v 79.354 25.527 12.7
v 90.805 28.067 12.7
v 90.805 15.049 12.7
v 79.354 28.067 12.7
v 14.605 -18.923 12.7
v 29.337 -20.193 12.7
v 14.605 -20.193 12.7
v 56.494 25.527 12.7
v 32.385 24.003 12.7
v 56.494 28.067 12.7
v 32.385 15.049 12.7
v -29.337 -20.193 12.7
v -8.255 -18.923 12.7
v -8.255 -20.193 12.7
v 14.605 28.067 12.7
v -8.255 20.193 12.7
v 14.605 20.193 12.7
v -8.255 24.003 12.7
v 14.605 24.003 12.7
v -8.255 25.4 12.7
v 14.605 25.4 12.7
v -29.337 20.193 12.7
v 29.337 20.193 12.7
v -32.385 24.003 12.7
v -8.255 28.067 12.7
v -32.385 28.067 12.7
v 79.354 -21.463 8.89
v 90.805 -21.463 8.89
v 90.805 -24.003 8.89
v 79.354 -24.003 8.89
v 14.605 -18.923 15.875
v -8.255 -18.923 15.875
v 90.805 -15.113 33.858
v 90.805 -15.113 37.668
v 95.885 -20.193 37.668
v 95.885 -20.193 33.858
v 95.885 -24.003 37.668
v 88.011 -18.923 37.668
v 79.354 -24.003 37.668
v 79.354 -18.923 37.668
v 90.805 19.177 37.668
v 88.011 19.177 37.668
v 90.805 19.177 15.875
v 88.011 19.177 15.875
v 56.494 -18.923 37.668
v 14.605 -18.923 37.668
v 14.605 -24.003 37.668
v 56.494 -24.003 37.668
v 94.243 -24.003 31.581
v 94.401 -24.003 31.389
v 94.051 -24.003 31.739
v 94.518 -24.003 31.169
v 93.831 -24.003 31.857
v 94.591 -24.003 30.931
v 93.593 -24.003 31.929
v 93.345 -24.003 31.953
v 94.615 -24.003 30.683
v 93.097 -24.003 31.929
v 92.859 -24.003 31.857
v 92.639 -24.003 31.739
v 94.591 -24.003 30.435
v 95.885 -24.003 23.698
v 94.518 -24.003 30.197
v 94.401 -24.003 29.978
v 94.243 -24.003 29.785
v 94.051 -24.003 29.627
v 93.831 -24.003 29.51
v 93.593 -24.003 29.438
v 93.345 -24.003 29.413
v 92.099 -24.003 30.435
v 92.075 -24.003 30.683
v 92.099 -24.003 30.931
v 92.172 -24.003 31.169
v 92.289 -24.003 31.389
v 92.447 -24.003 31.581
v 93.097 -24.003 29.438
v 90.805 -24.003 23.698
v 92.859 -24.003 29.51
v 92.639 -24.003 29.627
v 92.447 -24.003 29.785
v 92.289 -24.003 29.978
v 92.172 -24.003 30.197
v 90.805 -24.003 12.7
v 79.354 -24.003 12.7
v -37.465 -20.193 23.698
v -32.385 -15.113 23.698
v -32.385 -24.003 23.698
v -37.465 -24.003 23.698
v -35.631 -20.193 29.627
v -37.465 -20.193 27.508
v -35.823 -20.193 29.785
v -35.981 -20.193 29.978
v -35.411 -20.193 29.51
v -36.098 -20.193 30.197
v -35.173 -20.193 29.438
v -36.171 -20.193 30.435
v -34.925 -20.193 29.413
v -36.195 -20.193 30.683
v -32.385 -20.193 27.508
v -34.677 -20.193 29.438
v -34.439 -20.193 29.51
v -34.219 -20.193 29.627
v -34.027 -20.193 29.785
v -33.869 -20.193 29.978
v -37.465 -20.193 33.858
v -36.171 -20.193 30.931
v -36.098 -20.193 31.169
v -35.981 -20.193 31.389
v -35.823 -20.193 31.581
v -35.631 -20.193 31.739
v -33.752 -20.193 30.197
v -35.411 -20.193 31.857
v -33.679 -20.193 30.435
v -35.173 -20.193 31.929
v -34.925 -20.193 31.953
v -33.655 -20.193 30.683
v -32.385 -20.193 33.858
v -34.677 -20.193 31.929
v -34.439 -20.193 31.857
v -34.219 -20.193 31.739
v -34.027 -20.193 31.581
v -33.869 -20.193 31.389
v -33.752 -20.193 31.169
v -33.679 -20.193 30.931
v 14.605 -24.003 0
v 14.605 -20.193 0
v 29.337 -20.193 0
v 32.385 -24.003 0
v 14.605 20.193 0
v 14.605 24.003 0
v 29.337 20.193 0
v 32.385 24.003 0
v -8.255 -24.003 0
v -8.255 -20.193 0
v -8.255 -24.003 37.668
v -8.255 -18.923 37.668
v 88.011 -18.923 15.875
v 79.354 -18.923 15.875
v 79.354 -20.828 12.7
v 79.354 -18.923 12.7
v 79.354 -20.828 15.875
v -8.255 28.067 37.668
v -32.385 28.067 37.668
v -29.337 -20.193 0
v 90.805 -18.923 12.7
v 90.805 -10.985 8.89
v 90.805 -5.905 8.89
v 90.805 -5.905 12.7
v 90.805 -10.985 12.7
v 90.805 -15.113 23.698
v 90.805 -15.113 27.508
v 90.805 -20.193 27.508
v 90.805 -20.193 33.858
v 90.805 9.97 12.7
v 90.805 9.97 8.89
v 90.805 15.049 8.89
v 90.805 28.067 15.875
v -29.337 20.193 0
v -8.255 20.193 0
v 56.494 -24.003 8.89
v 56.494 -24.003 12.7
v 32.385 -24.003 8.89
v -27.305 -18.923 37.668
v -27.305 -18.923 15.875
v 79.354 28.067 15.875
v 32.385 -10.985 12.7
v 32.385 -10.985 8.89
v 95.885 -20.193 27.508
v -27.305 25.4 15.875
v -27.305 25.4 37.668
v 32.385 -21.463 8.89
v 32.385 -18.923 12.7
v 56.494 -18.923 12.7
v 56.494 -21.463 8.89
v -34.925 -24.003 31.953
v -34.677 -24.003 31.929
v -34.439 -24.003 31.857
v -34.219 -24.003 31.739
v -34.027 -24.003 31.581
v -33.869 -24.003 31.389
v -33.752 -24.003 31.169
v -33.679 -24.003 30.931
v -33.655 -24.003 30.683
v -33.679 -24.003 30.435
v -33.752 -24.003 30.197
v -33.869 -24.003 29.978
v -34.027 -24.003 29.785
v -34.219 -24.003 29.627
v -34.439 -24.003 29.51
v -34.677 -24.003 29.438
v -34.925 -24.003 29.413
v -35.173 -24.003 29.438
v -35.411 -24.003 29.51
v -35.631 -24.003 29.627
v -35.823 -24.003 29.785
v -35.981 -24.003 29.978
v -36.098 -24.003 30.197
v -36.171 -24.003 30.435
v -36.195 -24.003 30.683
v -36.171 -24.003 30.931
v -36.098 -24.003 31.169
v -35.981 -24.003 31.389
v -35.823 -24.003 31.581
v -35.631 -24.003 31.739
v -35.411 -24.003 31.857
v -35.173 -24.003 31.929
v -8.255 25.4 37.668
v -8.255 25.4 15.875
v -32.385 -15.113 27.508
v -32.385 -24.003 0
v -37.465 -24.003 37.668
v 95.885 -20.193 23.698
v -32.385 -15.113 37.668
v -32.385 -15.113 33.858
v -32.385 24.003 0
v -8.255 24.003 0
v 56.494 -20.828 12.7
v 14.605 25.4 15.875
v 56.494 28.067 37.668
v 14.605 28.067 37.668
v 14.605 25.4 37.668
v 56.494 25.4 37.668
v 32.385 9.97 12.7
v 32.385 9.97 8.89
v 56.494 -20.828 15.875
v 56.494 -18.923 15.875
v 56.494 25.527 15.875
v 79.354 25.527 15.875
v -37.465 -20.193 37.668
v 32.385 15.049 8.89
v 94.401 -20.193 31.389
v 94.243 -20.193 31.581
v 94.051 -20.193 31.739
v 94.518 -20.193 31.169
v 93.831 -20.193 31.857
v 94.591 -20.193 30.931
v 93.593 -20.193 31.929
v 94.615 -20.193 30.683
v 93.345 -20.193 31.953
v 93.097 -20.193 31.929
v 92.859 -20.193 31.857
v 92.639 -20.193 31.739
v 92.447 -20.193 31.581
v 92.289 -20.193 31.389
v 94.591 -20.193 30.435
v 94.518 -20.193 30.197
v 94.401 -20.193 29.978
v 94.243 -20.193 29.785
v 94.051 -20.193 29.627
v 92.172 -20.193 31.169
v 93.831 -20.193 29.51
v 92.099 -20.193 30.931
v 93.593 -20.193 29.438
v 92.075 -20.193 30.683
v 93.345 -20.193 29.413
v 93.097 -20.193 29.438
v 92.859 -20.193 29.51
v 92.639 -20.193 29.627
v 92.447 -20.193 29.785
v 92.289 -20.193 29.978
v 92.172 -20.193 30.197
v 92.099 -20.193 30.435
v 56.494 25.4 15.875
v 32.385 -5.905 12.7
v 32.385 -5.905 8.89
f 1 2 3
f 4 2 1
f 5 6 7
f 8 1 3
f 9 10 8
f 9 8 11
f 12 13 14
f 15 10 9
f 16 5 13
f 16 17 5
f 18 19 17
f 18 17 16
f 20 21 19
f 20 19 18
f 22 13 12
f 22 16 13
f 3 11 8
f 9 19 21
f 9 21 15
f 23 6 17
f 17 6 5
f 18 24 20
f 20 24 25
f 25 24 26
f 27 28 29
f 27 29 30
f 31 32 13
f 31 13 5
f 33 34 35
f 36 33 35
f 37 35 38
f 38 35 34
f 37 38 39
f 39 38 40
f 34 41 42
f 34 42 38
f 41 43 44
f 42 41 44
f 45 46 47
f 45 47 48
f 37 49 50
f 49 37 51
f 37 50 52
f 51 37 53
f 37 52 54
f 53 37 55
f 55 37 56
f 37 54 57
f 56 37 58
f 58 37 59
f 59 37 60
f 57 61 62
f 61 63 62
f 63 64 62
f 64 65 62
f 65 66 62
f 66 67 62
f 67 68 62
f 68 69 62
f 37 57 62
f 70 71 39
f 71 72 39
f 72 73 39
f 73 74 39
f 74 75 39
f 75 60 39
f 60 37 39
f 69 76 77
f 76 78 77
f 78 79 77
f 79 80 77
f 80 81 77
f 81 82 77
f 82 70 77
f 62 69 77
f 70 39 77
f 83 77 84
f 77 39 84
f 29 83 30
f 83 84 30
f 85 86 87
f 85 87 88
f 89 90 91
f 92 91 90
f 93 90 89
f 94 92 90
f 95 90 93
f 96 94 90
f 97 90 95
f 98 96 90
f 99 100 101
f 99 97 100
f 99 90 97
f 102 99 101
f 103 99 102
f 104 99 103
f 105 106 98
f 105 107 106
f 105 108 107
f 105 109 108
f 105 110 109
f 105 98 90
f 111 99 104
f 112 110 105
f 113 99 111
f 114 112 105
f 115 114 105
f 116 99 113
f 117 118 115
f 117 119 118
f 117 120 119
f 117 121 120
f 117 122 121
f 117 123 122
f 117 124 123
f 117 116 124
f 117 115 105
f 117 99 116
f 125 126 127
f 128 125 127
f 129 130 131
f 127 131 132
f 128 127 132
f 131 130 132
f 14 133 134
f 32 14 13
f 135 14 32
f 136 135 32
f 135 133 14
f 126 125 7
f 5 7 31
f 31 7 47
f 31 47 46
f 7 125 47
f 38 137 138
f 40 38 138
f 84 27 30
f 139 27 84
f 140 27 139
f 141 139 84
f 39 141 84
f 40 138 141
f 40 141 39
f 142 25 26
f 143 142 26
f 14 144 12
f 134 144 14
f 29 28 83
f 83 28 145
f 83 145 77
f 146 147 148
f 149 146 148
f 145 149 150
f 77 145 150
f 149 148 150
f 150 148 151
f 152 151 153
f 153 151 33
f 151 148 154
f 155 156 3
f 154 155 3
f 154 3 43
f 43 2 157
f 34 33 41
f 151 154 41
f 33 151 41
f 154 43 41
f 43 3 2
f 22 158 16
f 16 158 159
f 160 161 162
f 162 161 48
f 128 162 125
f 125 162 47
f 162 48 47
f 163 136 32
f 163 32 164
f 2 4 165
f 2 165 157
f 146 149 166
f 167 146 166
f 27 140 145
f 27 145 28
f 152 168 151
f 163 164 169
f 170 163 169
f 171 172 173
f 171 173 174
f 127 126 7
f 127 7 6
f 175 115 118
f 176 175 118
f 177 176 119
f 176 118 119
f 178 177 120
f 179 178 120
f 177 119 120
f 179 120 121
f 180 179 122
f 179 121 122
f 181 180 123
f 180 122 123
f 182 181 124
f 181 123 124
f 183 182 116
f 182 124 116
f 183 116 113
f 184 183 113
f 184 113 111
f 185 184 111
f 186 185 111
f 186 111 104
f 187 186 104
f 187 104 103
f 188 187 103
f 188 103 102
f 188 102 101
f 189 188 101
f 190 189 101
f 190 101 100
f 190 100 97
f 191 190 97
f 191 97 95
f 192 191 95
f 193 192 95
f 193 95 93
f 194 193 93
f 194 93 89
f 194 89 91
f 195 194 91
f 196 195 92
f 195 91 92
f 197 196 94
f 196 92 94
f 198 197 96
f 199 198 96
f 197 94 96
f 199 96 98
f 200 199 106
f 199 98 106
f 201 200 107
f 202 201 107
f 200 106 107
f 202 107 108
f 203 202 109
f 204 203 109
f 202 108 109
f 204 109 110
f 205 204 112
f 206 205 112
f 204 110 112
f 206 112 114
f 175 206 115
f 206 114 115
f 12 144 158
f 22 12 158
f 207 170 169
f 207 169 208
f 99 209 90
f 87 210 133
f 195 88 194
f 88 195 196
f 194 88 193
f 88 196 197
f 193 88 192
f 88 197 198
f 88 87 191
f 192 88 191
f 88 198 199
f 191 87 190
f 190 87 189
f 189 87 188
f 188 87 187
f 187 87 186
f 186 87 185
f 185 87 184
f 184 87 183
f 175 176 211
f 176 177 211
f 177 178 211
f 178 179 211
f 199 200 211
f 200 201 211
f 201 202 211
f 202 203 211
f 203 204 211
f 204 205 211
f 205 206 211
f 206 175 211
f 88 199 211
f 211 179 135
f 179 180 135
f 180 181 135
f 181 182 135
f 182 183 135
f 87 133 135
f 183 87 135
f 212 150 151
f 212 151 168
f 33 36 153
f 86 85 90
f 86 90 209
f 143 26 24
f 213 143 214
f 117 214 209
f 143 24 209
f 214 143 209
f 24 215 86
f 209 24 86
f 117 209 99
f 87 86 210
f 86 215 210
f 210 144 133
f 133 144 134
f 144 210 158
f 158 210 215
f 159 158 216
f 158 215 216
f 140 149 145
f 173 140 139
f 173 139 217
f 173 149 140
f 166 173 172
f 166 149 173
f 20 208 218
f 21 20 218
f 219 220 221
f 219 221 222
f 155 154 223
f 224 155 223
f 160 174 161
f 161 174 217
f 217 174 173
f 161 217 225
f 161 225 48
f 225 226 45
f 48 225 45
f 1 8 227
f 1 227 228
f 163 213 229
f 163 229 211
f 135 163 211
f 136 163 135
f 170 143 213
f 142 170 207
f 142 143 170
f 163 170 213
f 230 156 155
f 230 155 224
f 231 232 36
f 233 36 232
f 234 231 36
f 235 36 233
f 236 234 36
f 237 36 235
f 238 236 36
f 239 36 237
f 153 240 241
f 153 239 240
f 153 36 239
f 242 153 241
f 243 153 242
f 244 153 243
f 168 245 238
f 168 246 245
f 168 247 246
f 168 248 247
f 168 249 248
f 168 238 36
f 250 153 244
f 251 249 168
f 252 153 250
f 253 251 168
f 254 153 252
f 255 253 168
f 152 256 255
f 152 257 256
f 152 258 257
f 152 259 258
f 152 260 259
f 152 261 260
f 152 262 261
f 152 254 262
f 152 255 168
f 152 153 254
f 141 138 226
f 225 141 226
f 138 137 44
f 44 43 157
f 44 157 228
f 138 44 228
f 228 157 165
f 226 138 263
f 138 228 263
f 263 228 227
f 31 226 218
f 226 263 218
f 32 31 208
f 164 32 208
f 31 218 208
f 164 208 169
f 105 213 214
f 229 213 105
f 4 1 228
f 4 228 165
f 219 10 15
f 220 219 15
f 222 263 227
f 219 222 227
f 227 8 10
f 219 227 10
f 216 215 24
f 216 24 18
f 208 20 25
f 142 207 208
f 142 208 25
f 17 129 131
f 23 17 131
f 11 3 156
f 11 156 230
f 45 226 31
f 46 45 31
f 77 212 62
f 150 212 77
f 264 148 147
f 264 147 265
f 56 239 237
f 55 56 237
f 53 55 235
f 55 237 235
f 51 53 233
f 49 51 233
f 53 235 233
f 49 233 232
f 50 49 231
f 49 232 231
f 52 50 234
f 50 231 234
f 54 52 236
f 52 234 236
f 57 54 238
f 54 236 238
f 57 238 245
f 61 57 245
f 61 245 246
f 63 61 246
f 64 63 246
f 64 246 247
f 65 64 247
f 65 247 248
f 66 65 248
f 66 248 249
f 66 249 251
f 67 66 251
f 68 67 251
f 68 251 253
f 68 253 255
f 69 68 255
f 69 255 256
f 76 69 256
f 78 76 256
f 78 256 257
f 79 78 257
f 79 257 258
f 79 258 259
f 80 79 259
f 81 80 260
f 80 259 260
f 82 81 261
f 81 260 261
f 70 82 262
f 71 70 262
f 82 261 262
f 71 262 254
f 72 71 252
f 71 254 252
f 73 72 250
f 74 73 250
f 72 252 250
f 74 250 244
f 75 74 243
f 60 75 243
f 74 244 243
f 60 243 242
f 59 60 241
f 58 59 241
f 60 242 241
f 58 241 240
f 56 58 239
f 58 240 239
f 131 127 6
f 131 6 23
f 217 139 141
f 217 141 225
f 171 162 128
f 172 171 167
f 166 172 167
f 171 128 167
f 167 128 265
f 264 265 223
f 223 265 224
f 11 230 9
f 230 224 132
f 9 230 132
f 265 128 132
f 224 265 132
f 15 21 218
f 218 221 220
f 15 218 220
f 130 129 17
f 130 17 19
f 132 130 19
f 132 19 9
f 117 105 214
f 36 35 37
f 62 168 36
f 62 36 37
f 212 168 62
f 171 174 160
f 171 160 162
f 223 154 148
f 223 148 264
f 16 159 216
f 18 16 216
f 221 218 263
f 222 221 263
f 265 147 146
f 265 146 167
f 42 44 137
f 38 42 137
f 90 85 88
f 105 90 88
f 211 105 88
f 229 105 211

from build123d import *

# Parameters (mm, degrees)
SKETCH1_W            = 64.77
SKETCH1_H            = 48.006
SKETCH1_W_2          = 58.674
SKETCH1_H_2          = 40.386
BOSS_EXTRUDE1_DEPTH  = 12.7
BOSS_EXTRUDE2_DEPTH  = 3.175
BOSS_EXTRUDE3_DEPTH  = 21.7932
SKETCH6_W            = 22.86
SKETCH6_H            = 2.667
SKETCH6_H_2          = 5.08
CUT_EXTRUDE1_DEPTH   = 103.235990753
SKETCH7_W            = 22.86
SKETCH7_H            = 3.81
SKETCH7_H_2          = 1.143
CUT_EXTRUDE2_DEPTH   = 12.7
SKETCH10_W           = 13.97
SKETCH10_H           = 3.81
BOSS_EXTRUDE4_DEPTH  = 5.08
BOSS_EXTRUDE5_DEPTH  = 3.81
SKETCH12_R           = 1.27
CUT_EXTRUDE3_DEPTH   = 110.514697261
BOSS_EXTRUDE7_DEPTH  = 3.81
SKETCH14_W           = 13.97
SKETCH14_H           = 3.81
BOSS_EXTRUDE8_DEPTH  = 5.08
SKETCH15_R           = 1.27
CUT_EXTRUDE4_DEPTH   = 114.762270179
BOSS_EXTRUDE9_DEPTH  = 3.81
BOSS_EXTRUDE10_DEPTH = 3.81
SKETCH21_W           = 58.42
SKETCH21_H           = 5.08
SKETCH21_W_2         = 24.109012503
SKETCH21_H_2         = 2.54
SKETCH21_W_3         = 11.450987497
BOSS_EXTRUDE13_DEPTH = 3.81
BOSS_EXTRUDE14_DEPTH = 24.109012503
BOSS_EXTRUDE15_DEPTH = 11.450987497


with BuildPart() as part:
    # Sketch1 → Boss-Extrude1 (new body)
    with BuildSketch(Plane.XY):
        Rectangle(SKETCH1_W, SKETCH1_H)
        Rectangle(SKETCH1_W_2, SKETCH1_H_2, mode=Mode.SUBTRACT)
    extrude(amount=BOSS_EXTRUDE1_DEPTH)

    # Sketch3 → Boss-Extrude2 (add)
    with BuildSketch(Plane.XY.offset(12.7)):
        Polygon((79.354012503, -24.003), (79.354012503, -20.828), (56.494012503, -20.828), (56.494012503, -24.003), (-32.385, -24.003), (-32.385, 28.067), (56.494012503, 28.067), (56.494012503, 25.527), (79.354012503, 25.527), (79.354012503, 28.067), (90.805, 28.067), (90.805, -24.003), align=None)
    extrude(amount=BOSS_EXTRUDE2_DEPTH)

    # Sketch5 → Boss-Extrude3 (add)
    with BuildSketch(Plane.XY.offset(15.875)):
        Polygon((56.494012503, 28.067), (-32.385, 28.067), (-32.385, -24.003), (56.494012503, -24.003), (56.494012503, -18.923), (-27.305, -18.923), (-27.305, 25.4), (56.494012503, 25.4), align=None)
        Polygon((88.011, -18.923), (79.354012503, -18.923), (79.354012503, -24.003), (90.805, -24.003), (90.805, 19.177), (88.011, 19.177), align=None)
    extrude(amount=BOSS_EXTRUDE3_DEPTH)

    # Sketch6 → Cut-Extrude1 (cut, through all)
    with BuildSketch(Plane.XY.offset(37.6682)):
        with Locations((3.175, 26.7335)):
            Rectangle(SKETCH6_W, SKETCH6_H)
        with Locations((3.175, -21.463)):
            Rectangle(SKETCH6_W, SKETCH6_H_2)
    extrude(amount=-CUT_EXTRUDE1_DEPTH, mode=Mode.SUBTRACT)

    # Sketch7 → Cut-Extrude2 (cut)
    with BuildSketch(Plane(origin=(0, 0, 0), x_dir=(-1, 0, 0), z_dir=(0, 0, -1))):
        with Locations((-3.175, 22.098)):
            Rectangle(SKETCH7_W, SKETCH7_H)
        with Locations((-3.175, -20.7645)):
            Rectangle(SKETCH7_W, SKETCH7_H_2)
    extrude(amount=-CUT_EXTRUDE2_DEPTH, mode=Mode.SUBTRACT)

    # Sketch10 → Boss-Extrude4 (add)
    with BuildSketch(Plane.ZY.offset(32.385)):
        with Locations((30.6832, -22.098)):
            Rectangle(SKETCH10_W, SKETCH10_H)
    extrude(amount=BOSS_EXTRUDE4_DEPTH)

    # Sketch11 → Boss-Extrude5 (add)
    with BuildSketch(Plane.XY.offset(37.6682)):
        Polygon((-37.465, -20.193), (-32.385, -20.193), (-32.385, -15.113), align=None)
    extrude(amount=-BOSS_EXTRUDE5_DEPTH)

    # Sketch12 → Cut-Extrude3 (cut, through all)
    with BuildSketch(Plane(origin=(0, -20.193, 0), x_dir=(1, 0, 0), z_dir=(0, 1, 0))):
        with Locations(Location((-34.925, -30.6832, 0), (0, 0, 270))):
            Circle(SKETCH12_R)
    extrude(amount=-CUT_EXTRUDE3_DEPTH, mode=Mode.SUBTRACT)

    # Sketch13 → Boss-Extrude7 (add)
    with BuildSketch(Plane(origin=(0, 0, 23.6982), x_dir=(-1, 0, 0), z_dir=(0, 0, -1))):
        Polygon((32.385, -15.113), (32.385, -20.193), (37.465, -20.193), align=None)
    extrude(amount=-BOSS_EXTRUDE7_DEPTH)

    # Sketch14 → Boss-Extrude8 (add)
    with BuildSketch(Plane(origin=(90.805, 0, 0), x_dir=(0, 0, -1), z_dir=(1, 0, 0))):
        with Locations((-30.6832, -22.098)):
            Rectangle(SKETCH14_W, SKETCH14_H)
    extrude(amount=BOSS_EXTRUDE8_DEPTH)

    # Sketch15 → Cut-Extrude4 (cut, through all)
    with BuildSketch(Plane(origin=(0, -20.193, 0), x_dir=(1, 0, 0), z_dir=(0, 1, 0))):
        with Locations(Location((93.345, -30.6832, 0), (0, 0, 270))):
            Circle(SKETCH15_R)
    extrude(amount=-CUT_EXTRUDE4_DEPTH, mode=Mode.SUBTRACT)

    # Sketch17 → Boss-Extrude9 (add)
    with BuildSketch(Plane.XY.offset(37.6682)):
        Polygon((95.885, -20.193), (90.805, -20.193), (90.805, -15.113), align=None)
    extrude(amount=-BOSS_EXTRUDE9_DEPTH)

    # Sketch18 → Boss-Extrude10 (add)
    with BuildSketch(Plane(origin=(0, 0, 23.6982), x_dir=(-1, 0, 0), z_dir=(0, 0, -1))):
        Polygon((-95.885, -20.193), (-90.805, -20.193), (-90.805, -15.113), align=None)
    extrude(amount=-BOSS_EXTRUDE10_DEPTH)

    # Sketch21 → Boss-Extrude13 (add)
    with BuildSketch(Plane(origin=(0, 0, 12.7), x_dir=(-1, 0, 0), z_dir=(0, 0, -1))):
        with Locations((-61.595, 12.5095)):
            Rectangle(SKETCH21_W, SKETCH21_H)
        with Locations((-61.595, -8.4455)):
            Rectangle(SKETCH21_W, SKETCH21_H)
        with Locations((-44.439506252, -22.733)):
            Rectangle(SKETCH21_W_2, SKETCH21_H_2)
        with Locations((-85.079506252, -22.733)):
            Rectangle(SKETCH21_W_3, SKETCH21_H_2)
    extrude(amount=BOSS_EXTRUDE13_DEPTH)

    # Sketch22 → Boss-Extrude14 (add)
    with BuildSketch(Plane(origin=(56.494012503, 0, 0), x_dir=(0, 0, -1), z_dir=(1, 0, 0))):
        Polygon((-8.89, -21.463), (-12.7, -21.463), (-12.7, -18.923), align=None)
    extrude(amount=-BOSS_EXTRUDE14_DEPTH)

    # Sketch23 → Boss-Extrude15 (add)
    with BuildSketch(Plane(origin=(90.805, 0, 0), x_dir=(0, 0, -1), z_dir=(1, 0, 0))):
        Polygon((-8.89, -21.463), (-12.7, -21.463), (-12.7, -18.923), align=None)
    extrude(amount=-BOSS_EXTRUDE15_DEPTH)


solid = part.part
